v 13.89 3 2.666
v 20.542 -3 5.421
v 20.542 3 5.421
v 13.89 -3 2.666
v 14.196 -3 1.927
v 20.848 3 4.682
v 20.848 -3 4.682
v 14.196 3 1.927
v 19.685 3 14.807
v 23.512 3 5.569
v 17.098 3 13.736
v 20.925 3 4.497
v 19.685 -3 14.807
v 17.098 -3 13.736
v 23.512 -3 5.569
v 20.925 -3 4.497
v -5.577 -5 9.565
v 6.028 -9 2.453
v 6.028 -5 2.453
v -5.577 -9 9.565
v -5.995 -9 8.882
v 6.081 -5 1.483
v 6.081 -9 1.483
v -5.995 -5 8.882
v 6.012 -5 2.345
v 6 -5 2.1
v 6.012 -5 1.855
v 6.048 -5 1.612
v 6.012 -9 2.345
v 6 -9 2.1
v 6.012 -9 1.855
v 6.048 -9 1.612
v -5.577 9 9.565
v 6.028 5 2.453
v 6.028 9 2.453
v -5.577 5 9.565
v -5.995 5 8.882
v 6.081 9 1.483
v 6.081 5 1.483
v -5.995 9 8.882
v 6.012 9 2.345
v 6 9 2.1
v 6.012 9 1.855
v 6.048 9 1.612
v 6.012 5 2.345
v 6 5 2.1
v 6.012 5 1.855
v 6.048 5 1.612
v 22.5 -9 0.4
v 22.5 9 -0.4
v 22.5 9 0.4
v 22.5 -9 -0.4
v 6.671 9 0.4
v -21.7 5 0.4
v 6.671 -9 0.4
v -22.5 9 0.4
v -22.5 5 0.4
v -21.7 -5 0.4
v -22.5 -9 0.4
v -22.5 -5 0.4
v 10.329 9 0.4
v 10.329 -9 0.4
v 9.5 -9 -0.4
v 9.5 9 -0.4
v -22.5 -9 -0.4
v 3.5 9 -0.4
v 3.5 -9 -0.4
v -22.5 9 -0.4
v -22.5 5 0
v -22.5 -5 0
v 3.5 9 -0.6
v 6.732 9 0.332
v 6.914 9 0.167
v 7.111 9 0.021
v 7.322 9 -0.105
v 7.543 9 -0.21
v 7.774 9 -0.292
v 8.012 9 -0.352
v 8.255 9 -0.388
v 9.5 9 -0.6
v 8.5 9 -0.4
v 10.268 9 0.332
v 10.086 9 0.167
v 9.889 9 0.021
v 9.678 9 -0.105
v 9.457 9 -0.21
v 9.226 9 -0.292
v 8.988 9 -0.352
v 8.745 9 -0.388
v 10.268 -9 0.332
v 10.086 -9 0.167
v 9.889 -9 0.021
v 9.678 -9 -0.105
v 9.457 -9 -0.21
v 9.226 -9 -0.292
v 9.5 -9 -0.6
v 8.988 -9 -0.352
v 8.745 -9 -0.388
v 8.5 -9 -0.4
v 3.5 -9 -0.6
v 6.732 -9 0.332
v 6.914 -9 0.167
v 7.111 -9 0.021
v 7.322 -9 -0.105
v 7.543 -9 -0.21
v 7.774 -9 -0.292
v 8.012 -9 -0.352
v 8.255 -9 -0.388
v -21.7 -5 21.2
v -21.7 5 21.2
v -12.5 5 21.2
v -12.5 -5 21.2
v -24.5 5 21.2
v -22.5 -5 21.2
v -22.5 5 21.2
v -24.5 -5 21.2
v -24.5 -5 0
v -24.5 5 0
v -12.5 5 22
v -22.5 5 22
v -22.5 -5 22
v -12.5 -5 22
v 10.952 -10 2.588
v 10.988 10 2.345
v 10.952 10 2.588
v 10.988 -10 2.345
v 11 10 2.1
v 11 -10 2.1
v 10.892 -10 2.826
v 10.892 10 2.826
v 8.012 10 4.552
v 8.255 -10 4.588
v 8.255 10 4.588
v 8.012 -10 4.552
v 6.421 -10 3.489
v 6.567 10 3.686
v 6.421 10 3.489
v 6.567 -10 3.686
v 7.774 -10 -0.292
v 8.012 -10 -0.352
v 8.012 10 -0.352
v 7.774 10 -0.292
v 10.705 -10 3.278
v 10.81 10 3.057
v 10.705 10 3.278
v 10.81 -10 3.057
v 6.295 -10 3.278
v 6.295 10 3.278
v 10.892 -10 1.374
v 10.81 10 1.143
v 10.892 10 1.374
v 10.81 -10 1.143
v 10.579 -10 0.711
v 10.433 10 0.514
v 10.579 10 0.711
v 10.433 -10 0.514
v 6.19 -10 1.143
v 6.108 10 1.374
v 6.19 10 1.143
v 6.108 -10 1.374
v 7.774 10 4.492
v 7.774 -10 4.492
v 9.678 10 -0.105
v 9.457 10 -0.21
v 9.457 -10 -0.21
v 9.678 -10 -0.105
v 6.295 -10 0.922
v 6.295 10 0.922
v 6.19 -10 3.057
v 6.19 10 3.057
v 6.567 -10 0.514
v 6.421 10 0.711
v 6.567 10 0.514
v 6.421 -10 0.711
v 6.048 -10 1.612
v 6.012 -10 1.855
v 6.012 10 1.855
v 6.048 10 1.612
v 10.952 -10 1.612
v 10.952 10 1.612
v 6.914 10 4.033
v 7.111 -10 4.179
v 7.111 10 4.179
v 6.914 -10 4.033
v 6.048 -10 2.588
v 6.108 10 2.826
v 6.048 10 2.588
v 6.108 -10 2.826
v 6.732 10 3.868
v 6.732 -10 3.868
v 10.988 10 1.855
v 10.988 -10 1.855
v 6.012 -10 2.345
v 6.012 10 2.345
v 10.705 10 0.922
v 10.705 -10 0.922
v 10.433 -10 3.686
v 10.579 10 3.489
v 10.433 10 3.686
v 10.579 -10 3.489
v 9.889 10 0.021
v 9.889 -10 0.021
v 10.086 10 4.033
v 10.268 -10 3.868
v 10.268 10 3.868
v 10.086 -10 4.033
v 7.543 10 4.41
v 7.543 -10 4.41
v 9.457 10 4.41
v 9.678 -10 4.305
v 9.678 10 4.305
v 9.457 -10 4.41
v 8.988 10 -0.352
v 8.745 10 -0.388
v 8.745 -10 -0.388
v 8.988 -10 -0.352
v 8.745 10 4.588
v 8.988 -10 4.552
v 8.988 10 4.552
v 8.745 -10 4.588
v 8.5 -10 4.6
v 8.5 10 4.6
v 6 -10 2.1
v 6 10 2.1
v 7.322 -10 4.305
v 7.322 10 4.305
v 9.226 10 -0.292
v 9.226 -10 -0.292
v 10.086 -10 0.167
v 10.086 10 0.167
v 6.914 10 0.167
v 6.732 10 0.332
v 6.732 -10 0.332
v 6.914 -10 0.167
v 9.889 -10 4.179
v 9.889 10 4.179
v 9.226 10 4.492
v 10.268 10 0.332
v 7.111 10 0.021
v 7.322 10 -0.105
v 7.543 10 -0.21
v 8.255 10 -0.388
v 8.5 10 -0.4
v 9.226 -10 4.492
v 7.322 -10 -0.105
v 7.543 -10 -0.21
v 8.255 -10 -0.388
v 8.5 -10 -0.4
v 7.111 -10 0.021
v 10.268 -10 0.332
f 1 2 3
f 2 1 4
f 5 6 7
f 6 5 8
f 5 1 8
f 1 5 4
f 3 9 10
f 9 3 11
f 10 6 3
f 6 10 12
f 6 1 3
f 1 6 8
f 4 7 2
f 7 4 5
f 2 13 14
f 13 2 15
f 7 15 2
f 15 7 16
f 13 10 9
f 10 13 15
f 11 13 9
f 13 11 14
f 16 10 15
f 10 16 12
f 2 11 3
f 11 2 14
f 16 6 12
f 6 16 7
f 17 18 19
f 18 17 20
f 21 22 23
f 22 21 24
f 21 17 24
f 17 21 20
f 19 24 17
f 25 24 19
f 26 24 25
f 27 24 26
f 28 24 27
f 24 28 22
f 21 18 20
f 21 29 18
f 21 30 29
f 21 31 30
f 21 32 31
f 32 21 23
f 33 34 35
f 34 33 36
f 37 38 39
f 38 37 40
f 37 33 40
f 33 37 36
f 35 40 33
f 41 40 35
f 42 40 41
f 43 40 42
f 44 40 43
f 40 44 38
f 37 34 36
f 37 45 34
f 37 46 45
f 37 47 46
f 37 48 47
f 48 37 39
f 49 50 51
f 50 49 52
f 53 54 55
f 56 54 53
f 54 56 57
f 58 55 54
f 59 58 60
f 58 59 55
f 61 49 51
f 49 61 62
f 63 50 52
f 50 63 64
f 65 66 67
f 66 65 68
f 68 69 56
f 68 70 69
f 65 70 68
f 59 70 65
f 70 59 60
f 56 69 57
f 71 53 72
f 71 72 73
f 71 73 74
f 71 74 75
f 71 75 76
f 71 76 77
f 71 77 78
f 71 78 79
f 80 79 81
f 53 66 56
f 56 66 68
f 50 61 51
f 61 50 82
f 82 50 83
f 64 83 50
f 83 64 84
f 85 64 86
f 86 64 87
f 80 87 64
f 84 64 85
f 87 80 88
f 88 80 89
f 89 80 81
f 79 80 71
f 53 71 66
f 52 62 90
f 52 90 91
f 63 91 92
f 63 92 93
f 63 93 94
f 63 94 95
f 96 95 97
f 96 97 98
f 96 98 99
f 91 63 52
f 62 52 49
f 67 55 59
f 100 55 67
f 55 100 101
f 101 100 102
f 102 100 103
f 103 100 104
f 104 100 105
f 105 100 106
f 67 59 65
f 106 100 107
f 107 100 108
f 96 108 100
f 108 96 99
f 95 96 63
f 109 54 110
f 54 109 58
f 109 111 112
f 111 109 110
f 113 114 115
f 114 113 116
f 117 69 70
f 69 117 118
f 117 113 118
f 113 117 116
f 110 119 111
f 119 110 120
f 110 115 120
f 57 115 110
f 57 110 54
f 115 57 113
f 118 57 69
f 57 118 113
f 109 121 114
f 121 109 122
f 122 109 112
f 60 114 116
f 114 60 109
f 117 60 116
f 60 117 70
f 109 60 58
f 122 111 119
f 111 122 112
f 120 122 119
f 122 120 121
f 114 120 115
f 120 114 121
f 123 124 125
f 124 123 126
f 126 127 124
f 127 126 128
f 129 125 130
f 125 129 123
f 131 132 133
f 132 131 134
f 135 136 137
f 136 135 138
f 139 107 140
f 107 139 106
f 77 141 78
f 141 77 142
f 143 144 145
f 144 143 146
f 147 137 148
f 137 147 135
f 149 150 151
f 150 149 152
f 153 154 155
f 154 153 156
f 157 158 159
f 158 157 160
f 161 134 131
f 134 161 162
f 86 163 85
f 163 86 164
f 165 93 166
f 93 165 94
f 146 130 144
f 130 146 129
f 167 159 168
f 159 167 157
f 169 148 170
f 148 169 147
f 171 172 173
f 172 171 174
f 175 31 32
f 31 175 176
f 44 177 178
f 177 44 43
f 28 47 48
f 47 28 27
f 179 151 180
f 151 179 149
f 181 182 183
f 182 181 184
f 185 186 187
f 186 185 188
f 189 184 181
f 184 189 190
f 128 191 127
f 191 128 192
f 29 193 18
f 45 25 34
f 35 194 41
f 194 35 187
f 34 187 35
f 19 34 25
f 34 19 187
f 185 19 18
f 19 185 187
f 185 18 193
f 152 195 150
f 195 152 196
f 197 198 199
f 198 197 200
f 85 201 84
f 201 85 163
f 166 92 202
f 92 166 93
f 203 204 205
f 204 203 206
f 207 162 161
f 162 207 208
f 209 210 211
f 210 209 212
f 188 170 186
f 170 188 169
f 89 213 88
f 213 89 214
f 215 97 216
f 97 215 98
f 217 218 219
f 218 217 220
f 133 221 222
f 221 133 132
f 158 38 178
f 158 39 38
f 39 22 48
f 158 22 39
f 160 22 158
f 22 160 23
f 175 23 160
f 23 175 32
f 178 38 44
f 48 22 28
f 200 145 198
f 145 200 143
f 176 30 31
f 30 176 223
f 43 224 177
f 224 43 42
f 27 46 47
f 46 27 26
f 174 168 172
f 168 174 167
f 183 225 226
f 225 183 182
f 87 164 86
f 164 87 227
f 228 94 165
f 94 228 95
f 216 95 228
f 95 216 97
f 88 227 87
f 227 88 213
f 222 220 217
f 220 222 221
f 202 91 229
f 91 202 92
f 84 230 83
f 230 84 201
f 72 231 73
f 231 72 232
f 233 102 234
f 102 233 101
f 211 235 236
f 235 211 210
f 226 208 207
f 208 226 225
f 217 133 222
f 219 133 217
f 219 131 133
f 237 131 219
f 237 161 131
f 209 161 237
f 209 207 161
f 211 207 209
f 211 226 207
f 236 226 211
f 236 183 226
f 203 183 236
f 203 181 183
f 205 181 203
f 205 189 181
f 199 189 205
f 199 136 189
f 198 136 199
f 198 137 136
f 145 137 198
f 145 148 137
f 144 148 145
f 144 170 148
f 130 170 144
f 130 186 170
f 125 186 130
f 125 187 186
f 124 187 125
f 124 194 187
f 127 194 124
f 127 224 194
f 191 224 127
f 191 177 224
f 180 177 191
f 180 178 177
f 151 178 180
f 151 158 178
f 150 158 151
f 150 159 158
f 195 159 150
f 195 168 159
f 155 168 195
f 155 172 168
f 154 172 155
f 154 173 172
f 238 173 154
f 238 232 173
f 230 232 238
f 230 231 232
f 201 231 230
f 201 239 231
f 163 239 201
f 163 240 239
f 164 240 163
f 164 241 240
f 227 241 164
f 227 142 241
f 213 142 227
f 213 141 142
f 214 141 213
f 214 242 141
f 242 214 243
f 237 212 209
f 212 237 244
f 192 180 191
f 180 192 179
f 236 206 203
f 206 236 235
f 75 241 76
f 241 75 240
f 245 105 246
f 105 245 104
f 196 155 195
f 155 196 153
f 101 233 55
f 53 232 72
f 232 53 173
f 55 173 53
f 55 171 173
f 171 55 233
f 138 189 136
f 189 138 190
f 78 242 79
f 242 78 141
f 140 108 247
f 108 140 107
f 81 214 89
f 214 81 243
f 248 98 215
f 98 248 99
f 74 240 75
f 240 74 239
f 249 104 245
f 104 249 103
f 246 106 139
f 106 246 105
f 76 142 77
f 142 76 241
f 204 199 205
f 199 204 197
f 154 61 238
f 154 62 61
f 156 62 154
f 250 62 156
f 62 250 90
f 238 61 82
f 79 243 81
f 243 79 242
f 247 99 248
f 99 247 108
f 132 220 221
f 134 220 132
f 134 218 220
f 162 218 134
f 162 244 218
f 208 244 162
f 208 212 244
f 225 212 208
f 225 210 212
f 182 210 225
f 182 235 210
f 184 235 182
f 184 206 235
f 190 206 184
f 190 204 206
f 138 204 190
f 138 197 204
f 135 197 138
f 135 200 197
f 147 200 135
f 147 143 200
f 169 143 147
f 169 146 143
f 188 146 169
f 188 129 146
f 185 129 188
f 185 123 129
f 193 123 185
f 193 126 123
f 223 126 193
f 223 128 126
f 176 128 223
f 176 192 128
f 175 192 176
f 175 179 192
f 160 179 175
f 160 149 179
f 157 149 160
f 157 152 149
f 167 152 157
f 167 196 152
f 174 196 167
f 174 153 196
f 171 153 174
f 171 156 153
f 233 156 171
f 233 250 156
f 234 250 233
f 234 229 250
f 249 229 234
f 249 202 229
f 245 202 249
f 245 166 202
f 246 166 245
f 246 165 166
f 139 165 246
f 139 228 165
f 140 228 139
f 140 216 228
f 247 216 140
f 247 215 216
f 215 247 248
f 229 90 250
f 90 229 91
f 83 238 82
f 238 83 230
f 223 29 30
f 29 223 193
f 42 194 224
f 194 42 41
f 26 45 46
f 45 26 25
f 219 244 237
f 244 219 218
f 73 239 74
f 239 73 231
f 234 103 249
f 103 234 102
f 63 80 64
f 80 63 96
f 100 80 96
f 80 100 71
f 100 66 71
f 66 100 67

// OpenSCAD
// Parameters
clip_type = 0; //[0:2:1]
open_ratio = 0.9; //[0.2:1:0.05]
include_spigot_hole = 0; //[0:1:1]
hole_depth = 0; //[0:30:1]
L = 45; //[25:90:1]
W = 18; //[10:36:1]
H = 22; //[12:44:1]
t = 0.8; //[0.4:1.6:0.1]
bend_r = 2.5; //[1.2:5:0.1]
arm_l = 16; //[8:32:1]
arm_w = 4; //[2:8:0.5]
hinge_offset = 14; //[7:28:1]
hook_x = 10; //[5:20:1]
hook_y = 10; //[6:20:1]
spigot_x = 8; //[4:16:1]
spigot_y = 6; //[3:12:0.5]
spigot_z = 10; //[5:20:1]
overlap = 1; //[0.5:2:0.1]
arm_angle_deg = 35; //[5:70:1]
spigot_angle_deg = 25; //[5:60:1]
gusset_thickness = 0.8; //[0.4:1.6:0.1]
gusset_len = 6; //[3:12:0.5]
hole_clearance = 0.2; //[0:0.6:0.05]

$fn = 64;

function clamp(x, a, b) = x < a ? a : (x > b ? b : x);

module swiss_clip_solid() {
  // Ensure sane geometry
  Lc = max(L, 10);
  Wc = max(W, 6);
  tc = max(t, 0.4);
  Hr = max(H, tc*3);
  br = max(bend_r, tc*1.2);
  ov = clamp(overlap, 0.2, 3);

  // Key x-positions (all derived)
  x_left = -Lc/2;
  x_right =  Lc/2;

  // Hinge center near right side
  x_hinge = x_right - hinge_offset;

  // Hook region at left
  hook_len = clamp(hook_x, tc*2, Lc*0.6);
  hook_w   = clamp(hook_y, tc*3, Wc);
  x_hook_mid = x_left + hook_len/2;

  // Spigot region at right
  spx = clamp(spigot_x, tc*2, Lc*0.5);
  spy = clamp(spigot_y, tc*3, Wc);
  spz = clamp(spigot_z, tc*3, Hr);
  x_spigot_mid = x_right - spx/2;

  // Arms
  al = clamp(arm_l, tc*4, Lc*0.7);
  aw = clamp(arm_w, tc*2, Wc/2);
  arm_ang = arm_angle_deg * open_ratio;
  sp_ang  = spigot_angle_deg * open_ratio;

  // Place arms so their inner ends overlap the hinge region (connectivity)
  // Inner end x is at x_hinge - ov, so center is shifted by al/2 from that.
  x_arm_center = (x_hinge - ov) - al/2;

  // Z placement: keep everything around z=0 plane with slight overlaps
  z_plate = 0;
  z_up = tc/2;

  color([0.15, 0.2, 0.35])
  union() {

    // Main base plate (backbone)
    translate([0, 0, z_plate])
      cube([Lc, Wc, tc], center=true);

    // Left hook: U-shaped vertical return (connected to base)
    // Bottom lip (overlaps base)
    translate([x_hook_mid, 0, z_plate])
      cube([hook_len, hook_w, tc], center=true);

    // Vertical wall at extreme left (connects bottom and top lips)
    translate([x_left + tc/2 - ov, 0, (Hr - tc)/2])
      cube([tc + 2*ov, hook_w, Hr - tc], center=true);

    // Top lip
    translate([x_hook_mid, 0, Hr - tc/2])
      cube([hook_len, hook_w, tc], center=true);

    // Hinge/bend: a thickened band across width (connected to base)
    // Use a cylinder rotated to run along Y, centered at hinge x.
    translate([x_hinge, 0, br - tc/2])
      rotate([90, 0, 0])
        cylinder(r=br, h=Wc + 2*ov, center=true);

    // Add a small rectangular bridge under hinge to guarantee manifold connection
    translate([x_hinge, 0, z_plate])
      cube([2*br + tc, Wc, tc], center=true);

    // Spigot section: keep it connected by rotating around hinge line
    // Rotate about Y around hinge x, then place spigot relative to global.
    translate([x_hinge, 0, 0])
      rotate([0, -sp_ang, 0])
        translate([x_spigot_mid - x_hinge, 0, 0]) {
          // Spigot base pad (overlaps main plate)
          translate([0, 0, z_plate])
            cube([spx, spy, tc], center=true);

          // Spigot upright (overlaps pad)
          translate([spx/2 - tc/2 + ov, 0, tc/2 + spz/2 - ov])
            cube([tc + 2*ov, spy, spz], center=true);
        }

    // Spring arms: rotate about hinge line and overlap into hinge band
    translate([x_hinge, 0, 0])
      rotate([0, arm_ang, 0]) {
        // Left/right arms along Y edges
        translate([x_arm_center - x_hinge, -(Wc/2 - aw/2), z_up])
          cube([al, aw, tc], center=true);
        translate([x_arm_center - x_hinge,  (Wc/2 - aw/2), z_up])
          cube([al, aw, tc], center=true);

        // Small arm roots to ensure robust connection into hinge band
        root_len = max(tc*3, ov*2);
        translate([-(ov + root_len/2), -(Wc/2 - aw/2), z_up])
          cube([root_len, aw, tc], center=true);
        translate([-(ov + root_len/2),  (Wc/2 - aw/2), z_up])
          cube([root_len, aw, tc], center=true);
      }

    // Gussets: connect arms to base near hinge (kept unrotated for solidity)
    gl = clamp(gusset_len, tc*3, Lc*0.4);
    gt = clamp(gusset_thickness, tc*0.8, tc*3);

    // Center gusset
    translate([x_hinge - gl/2 + ov, 0, tc/2 + gt/2 - ov])
      cube([gl, Wc - 2*aw, gt], center=true);

    // Side gussets under arms
    translate([x_hinge - gl/2 + ov, -(Wc/2 - aw/2), tc/2 + gt/2 - ov])
      cube([gl, aw, gt], center=true);
    translate([x_hinge - gl/2 + ov,  (Wc/2 - aw/2), tc/2 + gt/2 - ov])
      cube([gl, aw, gt], center=true);
  }
}

module swiss_clip() {
  // Optional hole is a subtraction to keep one connected solid
  if (include_spigot_hole) {
    // Hole aligned through spigot upright (approx), derived from spigot dims and hinge
    Lc = max(L, 10);
    tc = max(t, 0.4);
    br = max(bend_r, tc*1.2);
    spx = clamp(spigot_x, tc*2, Lc*0.5);
    spy = clamp(spigot_y, tc*3, W);
    spz = clamp(spigot_z, tc*3, H);
    x_right =  Lc/2;
    x_hinge = x_right - hinge_offset;
    x_spigot_mid = x_right - spx/2;
    sp_ang  = spigot_angle_deg * open_ratio;

    hole_r = sqrt((spy/2)*(spy/2) + (spz/2)*(spz/2)) + hole_clearance;
    hole_h = (hole_depth > 0) ? hole_depth : (spx + 2*br + 2*tc);

    difference() {
      swiss_clip_solid();

      // Place hole by applying same hinge rotation used for spigot, then drilling along X
      translate([x_hinge, 0, 0])
        rotate([0, -sp_ang, 0])
          translate([x_spigot_mid - x_hinge + spx/2 - tc/2, 0, tc/2 + spz/2])
            rotate([0, 90, 0])
              cylinder(r=hole_r, h=hole_h, center=true);
    }
  } else {
    swiss_clip_solid();
  }
}

swiss_clip();
